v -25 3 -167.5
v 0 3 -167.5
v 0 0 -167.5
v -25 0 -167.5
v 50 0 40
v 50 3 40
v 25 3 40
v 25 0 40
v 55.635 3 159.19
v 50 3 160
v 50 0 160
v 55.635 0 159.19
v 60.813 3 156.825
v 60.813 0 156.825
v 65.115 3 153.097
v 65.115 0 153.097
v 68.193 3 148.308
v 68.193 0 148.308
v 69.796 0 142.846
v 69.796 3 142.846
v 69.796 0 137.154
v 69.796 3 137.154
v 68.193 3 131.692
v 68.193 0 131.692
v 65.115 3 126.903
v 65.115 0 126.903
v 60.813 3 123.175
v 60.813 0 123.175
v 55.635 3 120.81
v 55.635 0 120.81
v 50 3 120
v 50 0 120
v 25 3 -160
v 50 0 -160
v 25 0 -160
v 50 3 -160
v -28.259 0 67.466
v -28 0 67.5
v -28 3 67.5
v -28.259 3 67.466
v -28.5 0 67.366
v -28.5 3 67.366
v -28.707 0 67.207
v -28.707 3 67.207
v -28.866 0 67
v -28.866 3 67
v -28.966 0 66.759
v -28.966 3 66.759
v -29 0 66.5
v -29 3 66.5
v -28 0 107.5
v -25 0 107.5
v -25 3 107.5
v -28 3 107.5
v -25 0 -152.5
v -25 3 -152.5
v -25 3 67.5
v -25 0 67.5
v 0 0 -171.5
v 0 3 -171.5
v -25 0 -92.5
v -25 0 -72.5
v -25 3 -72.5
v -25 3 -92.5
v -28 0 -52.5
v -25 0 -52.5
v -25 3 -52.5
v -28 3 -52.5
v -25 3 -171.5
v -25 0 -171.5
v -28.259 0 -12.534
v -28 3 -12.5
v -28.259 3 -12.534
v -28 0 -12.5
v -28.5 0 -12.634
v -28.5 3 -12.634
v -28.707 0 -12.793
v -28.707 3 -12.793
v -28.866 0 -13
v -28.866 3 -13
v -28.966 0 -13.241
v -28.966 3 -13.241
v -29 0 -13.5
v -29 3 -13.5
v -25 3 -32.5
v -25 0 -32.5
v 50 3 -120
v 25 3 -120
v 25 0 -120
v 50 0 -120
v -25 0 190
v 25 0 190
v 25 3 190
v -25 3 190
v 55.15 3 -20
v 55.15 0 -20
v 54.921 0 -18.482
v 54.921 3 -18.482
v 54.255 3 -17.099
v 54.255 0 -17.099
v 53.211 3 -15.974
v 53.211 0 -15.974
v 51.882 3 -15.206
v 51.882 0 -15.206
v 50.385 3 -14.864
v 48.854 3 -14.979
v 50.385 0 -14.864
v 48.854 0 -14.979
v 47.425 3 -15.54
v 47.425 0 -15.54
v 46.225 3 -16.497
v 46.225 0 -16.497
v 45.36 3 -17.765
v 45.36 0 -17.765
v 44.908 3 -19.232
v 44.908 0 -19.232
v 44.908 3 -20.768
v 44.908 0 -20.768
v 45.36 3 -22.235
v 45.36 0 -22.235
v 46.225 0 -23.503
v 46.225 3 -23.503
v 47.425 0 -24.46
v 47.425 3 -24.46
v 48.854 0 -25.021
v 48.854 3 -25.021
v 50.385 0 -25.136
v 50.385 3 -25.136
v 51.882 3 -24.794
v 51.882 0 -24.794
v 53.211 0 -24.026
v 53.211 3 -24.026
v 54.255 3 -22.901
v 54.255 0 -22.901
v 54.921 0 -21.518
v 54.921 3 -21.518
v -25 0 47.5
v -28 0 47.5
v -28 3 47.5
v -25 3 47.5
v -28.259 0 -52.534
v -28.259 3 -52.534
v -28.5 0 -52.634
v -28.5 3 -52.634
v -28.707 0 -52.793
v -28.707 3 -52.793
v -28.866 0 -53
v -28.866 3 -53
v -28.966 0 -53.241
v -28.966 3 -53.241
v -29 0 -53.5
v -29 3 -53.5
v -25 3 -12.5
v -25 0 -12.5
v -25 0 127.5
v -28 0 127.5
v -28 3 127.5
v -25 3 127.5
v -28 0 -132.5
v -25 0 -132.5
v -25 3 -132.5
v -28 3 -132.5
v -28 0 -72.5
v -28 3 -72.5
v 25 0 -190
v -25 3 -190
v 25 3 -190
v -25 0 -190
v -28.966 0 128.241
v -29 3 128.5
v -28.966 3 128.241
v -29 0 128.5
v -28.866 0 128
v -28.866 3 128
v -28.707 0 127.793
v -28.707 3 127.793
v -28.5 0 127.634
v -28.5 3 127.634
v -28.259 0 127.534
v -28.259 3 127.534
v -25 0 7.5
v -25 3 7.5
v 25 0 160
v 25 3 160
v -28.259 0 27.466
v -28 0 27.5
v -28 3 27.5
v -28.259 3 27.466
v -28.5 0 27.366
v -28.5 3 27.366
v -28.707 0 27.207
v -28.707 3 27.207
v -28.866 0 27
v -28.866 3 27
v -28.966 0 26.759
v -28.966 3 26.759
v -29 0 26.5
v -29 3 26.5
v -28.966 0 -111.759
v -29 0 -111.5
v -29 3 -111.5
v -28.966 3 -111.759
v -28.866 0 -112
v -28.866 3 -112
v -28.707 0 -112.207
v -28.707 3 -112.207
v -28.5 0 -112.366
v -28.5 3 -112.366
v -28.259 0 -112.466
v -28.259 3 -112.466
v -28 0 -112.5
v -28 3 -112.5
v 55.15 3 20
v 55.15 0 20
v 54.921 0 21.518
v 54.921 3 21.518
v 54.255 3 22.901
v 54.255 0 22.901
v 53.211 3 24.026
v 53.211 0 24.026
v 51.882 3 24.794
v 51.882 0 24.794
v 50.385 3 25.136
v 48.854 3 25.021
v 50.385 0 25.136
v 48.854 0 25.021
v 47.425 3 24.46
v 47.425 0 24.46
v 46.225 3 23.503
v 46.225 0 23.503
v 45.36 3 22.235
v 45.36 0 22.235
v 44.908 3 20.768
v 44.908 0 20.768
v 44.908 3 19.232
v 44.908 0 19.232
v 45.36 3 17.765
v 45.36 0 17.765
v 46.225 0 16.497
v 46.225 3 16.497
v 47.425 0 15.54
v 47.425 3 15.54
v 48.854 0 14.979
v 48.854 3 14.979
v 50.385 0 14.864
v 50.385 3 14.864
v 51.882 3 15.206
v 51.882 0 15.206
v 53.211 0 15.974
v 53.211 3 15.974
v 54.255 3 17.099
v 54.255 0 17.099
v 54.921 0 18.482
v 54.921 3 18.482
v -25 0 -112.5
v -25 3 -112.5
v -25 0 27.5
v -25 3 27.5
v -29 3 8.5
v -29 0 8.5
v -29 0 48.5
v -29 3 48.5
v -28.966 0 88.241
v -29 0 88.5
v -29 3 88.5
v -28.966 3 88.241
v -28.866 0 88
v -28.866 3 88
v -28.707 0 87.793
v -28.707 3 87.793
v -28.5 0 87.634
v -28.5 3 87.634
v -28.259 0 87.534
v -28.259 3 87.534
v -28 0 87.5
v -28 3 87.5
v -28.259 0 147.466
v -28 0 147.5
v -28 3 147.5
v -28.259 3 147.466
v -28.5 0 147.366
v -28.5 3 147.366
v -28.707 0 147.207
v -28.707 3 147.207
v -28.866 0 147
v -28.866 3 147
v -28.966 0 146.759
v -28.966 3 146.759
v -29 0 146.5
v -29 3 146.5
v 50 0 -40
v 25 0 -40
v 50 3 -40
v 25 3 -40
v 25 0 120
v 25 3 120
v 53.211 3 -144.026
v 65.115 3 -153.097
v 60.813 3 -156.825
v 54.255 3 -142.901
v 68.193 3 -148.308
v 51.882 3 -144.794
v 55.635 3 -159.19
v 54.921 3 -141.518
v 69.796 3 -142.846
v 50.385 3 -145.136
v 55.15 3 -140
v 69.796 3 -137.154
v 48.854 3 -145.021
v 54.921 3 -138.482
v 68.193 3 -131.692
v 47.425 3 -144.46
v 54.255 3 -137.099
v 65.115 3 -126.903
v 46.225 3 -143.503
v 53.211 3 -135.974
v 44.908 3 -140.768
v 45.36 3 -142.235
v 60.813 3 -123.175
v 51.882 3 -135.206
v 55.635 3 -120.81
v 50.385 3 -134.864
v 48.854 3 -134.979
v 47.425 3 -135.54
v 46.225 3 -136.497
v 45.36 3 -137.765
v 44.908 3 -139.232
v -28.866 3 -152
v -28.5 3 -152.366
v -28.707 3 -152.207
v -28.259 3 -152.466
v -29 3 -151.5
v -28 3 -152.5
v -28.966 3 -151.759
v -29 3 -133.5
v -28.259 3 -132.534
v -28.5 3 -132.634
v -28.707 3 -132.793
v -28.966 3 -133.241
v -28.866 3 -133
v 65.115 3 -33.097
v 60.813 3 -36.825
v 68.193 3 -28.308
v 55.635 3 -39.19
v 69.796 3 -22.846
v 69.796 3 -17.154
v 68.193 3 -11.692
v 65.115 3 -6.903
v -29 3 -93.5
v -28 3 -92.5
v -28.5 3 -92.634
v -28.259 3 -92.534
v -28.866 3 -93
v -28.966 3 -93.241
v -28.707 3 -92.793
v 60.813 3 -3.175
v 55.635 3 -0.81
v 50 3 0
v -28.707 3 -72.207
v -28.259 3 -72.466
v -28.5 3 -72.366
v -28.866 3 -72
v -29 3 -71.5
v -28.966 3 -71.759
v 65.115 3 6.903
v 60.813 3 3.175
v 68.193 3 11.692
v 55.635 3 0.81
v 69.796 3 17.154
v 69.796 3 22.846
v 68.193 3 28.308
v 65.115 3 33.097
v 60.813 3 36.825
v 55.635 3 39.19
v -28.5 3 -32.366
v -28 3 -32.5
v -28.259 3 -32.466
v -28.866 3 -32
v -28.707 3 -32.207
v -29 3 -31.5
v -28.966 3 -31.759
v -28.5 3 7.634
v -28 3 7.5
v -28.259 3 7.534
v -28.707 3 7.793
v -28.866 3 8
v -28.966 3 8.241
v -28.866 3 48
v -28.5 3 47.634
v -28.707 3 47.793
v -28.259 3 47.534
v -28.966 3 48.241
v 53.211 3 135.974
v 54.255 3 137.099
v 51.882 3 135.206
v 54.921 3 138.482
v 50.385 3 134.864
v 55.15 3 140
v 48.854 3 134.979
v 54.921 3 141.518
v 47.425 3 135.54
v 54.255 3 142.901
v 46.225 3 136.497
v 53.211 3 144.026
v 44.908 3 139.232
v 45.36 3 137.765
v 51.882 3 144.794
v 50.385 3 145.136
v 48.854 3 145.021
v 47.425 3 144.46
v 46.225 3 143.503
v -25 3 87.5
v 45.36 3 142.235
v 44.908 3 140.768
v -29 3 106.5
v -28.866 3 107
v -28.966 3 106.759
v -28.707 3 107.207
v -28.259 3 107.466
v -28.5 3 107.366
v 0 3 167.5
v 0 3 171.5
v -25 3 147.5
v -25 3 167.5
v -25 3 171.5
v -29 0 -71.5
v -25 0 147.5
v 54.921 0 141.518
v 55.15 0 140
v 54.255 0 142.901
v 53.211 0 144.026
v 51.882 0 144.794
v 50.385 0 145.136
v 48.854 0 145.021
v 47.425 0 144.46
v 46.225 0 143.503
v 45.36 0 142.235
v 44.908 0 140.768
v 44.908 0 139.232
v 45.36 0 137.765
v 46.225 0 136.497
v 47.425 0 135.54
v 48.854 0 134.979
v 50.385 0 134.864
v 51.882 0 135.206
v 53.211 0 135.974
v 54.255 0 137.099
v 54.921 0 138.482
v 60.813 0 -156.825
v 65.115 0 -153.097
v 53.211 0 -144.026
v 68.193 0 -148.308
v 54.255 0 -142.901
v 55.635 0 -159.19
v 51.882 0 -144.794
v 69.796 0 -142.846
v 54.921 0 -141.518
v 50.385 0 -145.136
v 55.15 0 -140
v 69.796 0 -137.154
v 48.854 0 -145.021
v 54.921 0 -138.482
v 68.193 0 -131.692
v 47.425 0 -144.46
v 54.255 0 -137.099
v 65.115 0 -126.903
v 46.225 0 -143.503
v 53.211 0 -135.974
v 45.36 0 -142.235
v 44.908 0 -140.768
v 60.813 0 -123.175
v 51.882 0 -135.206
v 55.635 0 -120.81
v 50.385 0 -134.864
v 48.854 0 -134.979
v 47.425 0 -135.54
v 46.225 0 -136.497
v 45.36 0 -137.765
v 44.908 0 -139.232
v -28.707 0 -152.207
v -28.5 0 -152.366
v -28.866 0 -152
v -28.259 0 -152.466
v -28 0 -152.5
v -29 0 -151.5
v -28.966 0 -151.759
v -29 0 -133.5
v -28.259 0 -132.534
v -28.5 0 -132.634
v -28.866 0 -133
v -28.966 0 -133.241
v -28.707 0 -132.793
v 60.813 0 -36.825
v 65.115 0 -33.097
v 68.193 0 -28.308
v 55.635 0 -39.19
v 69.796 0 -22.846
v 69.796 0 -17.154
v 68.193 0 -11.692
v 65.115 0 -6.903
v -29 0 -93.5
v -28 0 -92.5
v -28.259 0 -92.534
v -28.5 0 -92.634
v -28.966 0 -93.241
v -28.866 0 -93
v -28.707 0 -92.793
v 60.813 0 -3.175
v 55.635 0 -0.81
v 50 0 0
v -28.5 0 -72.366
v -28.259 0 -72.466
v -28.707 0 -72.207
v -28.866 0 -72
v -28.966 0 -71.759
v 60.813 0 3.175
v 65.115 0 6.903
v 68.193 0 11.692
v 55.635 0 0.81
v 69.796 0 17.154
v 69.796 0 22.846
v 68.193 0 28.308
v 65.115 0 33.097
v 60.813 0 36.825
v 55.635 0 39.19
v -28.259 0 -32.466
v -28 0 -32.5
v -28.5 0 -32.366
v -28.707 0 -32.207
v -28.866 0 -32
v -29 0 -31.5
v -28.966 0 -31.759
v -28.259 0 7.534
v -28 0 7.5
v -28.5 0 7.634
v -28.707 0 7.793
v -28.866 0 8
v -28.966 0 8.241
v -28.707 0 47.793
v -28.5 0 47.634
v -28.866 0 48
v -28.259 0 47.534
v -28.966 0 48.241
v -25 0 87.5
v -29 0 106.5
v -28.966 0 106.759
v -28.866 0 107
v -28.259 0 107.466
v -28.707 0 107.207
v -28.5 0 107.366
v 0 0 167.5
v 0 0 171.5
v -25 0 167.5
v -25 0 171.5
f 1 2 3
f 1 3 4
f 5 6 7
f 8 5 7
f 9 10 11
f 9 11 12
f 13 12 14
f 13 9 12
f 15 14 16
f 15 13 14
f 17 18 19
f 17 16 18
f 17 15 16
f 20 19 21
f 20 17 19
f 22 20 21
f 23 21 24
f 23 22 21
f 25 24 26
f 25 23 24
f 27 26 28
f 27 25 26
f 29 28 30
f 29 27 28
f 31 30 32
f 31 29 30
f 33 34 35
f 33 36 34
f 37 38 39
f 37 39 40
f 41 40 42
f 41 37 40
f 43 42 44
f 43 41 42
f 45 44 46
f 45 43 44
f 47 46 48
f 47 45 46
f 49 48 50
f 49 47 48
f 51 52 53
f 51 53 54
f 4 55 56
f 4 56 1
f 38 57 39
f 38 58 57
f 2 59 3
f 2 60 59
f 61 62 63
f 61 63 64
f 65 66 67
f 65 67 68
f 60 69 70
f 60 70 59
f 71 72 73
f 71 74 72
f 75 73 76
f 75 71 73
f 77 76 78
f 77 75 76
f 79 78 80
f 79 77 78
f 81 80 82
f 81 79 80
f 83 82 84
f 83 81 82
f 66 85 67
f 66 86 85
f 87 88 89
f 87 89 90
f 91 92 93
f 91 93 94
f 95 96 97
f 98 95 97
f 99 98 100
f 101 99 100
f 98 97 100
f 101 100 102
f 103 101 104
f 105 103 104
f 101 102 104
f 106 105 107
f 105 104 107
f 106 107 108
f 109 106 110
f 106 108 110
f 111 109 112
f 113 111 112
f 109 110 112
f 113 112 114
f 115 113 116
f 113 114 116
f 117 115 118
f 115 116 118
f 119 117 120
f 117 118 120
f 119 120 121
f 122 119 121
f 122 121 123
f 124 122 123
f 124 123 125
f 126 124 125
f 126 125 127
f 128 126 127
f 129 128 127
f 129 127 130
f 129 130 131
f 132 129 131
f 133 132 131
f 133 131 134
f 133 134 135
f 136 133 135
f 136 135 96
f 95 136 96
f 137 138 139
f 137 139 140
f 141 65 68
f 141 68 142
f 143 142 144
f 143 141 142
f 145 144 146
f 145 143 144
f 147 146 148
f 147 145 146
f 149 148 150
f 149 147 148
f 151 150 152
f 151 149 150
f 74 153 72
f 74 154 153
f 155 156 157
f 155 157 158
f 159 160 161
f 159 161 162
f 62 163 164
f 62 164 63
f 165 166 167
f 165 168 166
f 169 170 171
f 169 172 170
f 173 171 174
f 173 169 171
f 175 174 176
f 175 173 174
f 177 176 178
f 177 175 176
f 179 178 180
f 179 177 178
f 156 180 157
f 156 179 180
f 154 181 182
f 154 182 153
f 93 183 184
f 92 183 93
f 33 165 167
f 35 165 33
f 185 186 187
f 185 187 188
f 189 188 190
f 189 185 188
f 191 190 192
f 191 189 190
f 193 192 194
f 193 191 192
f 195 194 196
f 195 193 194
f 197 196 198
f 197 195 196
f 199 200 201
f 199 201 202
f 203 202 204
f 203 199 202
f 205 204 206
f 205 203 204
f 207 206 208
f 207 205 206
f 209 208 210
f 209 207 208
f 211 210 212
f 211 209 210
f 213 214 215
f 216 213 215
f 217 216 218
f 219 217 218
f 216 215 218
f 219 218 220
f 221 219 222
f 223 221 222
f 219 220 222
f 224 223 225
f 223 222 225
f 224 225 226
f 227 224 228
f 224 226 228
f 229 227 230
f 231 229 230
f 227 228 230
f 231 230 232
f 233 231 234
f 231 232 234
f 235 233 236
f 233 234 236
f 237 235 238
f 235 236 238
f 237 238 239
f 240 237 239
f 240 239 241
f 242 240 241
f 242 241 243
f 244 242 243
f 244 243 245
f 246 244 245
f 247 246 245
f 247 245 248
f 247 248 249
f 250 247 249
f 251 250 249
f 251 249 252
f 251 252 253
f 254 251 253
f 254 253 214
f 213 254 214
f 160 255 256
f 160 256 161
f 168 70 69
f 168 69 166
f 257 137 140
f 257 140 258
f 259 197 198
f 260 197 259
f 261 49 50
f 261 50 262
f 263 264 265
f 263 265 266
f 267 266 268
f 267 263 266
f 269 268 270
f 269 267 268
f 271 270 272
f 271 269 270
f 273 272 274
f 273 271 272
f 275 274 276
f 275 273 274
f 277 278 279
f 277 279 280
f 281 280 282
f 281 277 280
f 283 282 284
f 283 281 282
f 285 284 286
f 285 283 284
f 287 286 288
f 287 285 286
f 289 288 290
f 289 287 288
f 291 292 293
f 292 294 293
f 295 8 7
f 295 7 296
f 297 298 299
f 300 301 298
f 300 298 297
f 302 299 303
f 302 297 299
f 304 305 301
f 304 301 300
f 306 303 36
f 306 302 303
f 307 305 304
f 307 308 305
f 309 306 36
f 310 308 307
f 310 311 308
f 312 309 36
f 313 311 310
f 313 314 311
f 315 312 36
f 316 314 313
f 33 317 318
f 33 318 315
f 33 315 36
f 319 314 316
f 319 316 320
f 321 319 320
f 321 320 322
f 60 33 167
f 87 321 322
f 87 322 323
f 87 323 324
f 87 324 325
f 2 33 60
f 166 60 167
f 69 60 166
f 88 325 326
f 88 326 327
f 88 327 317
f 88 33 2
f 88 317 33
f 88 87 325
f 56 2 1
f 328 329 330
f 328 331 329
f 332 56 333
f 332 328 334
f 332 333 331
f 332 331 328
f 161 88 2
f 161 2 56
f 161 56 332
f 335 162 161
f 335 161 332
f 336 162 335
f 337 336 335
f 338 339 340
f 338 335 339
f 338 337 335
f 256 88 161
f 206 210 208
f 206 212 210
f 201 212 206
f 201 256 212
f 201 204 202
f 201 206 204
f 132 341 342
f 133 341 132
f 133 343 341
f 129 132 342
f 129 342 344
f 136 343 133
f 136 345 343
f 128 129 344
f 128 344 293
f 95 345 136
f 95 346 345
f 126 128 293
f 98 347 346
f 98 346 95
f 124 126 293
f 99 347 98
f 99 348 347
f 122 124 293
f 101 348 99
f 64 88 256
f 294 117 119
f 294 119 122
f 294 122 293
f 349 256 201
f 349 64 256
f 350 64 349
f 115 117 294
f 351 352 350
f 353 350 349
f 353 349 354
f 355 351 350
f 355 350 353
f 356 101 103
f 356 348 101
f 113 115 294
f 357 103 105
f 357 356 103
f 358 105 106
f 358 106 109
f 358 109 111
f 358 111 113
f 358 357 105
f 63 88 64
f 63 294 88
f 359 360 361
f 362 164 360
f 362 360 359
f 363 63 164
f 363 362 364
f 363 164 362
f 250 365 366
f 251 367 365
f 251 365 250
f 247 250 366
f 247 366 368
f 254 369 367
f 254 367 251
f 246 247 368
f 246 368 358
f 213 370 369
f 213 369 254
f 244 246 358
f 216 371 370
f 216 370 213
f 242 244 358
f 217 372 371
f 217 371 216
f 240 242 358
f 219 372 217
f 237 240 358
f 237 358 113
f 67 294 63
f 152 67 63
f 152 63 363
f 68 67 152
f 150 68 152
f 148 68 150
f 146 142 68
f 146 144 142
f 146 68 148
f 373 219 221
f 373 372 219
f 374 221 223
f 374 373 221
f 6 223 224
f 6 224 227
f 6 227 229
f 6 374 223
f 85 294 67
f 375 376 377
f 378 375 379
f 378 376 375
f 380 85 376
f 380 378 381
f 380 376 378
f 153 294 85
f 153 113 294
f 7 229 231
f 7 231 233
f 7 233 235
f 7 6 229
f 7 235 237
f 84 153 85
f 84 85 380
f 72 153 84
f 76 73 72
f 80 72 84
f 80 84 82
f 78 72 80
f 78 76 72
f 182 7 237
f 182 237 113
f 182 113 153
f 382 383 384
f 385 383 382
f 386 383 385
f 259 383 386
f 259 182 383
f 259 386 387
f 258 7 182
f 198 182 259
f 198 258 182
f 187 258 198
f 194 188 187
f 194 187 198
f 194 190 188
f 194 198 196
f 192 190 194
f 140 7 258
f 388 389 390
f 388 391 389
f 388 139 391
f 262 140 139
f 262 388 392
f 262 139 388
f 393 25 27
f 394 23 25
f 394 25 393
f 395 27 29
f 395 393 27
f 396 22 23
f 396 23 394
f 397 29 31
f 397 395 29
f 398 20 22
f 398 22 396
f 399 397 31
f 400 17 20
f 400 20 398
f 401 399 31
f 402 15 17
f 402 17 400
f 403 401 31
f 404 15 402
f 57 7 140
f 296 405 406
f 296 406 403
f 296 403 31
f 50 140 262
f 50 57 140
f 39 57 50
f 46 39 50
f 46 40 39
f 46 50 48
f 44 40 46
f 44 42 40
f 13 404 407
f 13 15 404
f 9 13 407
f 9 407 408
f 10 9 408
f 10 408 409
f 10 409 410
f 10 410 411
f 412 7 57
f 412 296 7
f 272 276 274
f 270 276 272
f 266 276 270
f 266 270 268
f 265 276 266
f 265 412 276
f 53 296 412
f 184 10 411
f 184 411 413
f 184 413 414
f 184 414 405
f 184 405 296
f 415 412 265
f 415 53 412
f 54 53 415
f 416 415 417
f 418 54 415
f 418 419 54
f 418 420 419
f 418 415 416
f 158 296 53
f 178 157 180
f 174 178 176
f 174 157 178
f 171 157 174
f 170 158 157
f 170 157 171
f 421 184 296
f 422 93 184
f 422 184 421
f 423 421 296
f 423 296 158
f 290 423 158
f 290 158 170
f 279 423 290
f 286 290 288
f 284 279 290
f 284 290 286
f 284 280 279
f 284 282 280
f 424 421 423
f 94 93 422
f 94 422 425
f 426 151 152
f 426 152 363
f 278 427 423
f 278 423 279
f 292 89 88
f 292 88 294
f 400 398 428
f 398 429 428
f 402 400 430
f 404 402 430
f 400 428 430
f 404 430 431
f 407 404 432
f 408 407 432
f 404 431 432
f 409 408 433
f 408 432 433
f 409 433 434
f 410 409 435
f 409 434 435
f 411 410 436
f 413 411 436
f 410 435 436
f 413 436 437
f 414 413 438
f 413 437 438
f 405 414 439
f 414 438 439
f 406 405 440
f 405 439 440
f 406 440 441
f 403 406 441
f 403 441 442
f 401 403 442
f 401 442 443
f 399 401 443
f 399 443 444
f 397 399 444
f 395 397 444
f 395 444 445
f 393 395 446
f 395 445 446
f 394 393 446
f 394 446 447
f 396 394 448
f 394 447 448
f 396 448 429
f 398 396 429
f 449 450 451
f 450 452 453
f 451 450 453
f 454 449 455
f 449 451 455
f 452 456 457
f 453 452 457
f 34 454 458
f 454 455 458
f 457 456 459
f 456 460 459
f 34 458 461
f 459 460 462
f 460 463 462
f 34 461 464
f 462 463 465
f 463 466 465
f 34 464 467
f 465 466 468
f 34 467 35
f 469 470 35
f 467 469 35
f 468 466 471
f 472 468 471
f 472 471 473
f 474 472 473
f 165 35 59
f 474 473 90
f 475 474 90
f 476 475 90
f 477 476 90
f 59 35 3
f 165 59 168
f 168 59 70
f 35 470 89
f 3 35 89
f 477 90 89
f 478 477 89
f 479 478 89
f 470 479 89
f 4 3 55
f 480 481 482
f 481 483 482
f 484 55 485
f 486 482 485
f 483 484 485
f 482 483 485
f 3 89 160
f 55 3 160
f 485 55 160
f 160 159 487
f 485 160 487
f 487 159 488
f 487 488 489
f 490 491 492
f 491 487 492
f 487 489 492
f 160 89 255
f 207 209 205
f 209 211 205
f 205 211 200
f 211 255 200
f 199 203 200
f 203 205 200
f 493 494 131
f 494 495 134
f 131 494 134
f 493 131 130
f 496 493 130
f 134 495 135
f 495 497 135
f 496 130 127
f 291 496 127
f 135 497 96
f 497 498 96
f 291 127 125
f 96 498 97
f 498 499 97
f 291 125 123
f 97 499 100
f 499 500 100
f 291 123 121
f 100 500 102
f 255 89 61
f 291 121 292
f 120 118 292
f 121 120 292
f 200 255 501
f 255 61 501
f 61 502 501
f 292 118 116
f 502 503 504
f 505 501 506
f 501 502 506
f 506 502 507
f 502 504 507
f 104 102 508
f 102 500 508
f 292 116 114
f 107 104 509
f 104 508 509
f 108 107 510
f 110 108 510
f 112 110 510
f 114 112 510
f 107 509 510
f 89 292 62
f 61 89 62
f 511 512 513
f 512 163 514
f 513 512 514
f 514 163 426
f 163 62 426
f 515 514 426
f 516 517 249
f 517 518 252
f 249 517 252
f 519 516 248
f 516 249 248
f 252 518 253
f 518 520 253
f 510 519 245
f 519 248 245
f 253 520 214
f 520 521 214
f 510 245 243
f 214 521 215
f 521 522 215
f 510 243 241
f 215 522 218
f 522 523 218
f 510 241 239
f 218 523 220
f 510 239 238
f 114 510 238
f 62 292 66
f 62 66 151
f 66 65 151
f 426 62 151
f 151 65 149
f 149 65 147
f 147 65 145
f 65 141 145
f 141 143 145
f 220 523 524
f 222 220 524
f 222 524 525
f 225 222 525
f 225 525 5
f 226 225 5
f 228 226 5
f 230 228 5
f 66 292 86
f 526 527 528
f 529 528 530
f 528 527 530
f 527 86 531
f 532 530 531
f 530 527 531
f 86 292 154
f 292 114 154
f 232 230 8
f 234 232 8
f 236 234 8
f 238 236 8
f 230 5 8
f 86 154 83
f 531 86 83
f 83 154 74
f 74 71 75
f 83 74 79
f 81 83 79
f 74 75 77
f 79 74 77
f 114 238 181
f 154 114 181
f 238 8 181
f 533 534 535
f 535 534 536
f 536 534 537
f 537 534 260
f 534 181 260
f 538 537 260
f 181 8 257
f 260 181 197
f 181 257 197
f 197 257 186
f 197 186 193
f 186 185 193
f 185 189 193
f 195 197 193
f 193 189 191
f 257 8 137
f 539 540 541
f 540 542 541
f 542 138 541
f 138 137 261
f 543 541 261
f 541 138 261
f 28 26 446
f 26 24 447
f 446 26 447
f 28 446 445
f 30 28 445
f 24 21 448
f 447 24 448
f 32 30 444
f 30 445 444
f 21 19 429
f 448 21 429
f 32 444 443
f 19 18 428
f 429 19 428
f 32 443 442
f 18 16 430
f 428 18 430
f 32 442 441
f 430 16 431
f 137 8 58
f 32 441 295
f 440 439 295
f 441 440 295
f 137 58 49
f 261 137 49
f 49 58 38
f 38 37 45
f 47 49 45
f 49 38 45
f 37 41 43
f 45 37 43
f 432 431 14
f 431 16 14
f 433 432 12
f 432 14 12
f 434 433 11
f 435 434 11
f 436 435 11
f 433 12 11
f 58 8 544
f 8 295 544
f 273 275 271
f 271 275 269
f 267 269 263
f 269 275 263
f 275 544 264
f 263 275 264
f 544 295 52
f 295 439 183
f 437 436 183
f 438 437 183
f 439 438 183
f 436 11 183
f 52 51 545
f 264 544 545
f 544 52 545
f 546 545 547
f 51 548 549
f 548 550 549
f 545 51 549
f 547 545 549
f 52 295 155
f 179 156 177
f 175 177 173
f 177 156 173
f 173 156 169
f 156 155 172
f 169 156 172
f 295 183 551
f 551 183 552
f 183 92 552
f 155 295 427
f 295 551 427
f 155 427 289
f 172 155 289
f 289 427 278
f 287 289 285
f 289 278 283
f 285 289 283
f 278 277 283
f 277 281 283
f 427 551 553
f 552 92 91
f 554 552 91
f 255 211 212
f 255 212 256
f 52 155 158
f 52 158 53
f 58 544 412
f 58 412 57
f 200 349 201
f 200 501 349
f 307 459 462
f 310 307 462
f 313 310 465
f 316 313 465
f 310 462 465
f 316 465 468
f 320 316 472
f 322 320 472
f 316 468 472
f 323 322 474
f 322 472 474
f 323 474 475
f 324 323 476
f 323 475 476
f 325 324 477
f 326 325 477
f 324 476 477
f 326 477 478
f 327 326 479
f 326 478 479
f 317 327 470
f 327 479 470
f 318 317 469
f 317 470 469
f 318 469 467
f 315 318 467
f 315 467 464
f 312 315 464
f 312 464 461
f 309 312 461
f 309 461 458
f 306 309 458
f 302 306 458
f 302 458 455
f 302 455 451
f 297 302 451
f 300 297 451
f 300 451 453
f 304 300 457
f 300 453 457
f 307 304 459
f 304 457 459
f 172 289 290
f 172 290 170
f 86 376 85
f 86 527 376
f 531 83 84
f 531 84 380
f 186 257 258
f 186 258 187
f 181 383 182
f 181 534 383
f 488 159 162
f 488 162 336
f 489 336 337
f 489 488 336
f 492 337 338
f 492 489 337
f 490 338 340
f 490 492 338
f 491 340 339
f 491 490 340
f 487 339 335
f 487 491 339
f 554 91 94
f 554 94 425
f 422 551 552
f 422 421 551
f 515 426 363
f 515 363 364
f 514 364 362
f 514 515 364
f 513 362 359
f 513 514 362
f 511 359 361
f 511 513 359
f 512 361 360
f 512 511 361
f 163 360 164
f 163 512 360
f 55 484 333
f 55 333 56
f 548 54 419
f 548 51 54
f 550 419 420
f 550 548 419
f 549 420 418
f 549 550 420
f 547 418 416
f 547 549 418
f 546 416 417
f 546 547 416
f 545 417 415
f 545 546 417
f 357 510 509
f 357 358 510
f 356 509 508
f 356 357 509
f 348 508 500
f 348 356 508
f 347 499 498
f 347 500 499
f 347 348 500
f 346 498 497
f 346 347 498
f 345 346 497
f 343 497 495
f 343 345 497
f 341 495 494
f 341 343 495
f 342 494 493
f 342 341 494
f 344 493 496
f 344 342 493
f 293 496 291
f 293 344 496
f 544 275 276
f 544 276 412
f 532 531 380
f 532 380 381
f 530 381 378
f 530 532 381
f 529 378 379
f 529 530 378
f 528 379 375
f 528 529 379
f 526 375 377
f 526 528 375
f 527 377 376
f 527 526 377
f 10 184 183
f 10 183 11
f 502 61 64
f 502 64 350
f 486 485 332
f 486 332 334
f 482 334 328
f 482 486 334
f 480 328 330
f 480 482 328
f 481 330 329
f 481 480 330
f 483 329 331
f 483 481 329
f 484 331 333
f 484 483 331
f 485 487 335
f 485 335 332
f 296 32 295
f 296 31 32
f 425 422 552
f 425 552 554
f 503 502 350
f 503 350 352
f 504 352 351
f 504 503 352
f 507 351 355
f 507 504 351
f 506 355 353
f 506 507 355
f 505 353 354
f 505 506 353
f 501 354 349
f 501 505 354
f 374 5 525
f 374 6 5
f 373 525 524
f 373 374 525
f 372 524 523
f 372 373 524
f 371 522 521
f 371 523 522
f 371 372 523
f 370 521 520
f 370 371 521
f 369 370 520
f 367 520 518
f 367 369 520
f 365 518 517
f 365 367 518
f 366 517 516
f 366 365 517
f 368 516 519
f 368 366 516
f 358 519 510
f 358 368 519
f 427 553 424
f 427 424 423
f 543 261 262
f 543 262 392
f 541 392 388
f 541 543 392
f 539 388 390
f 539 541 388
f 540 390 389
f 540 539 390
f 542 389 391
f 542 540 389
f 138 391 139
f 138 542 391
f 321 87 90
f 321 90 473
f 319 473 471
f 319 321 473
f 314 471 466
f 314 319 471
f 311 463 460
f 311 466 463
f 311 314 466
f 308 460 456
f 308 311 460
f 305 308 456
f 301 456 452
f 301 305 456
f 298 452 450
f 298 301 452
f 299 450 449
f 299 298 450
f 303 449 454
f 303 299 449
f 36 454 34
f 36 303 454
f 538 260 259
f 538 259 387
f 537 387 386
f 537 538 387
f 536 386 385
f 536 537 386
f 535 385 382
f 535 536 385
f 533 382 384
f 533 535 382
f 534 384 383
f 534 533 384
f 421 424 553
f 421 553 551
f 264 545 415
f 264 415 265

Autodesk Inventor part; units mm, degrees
ref_plane "YZ Plane" through (0, 0, 0) normal (1, 0, 0) x (0, 1, 0)
ref_plane "XZ Plane" through (0, 0, 0) normal (0, 1, 0) x (-1, 0, 0)
ref_plane "XY Plane" through (0, 0, 0) normal (0, 0, 1) x (1, 0, 0)
sketch "Sketch1" plane through (0, 0, 0) normal (0, 1, 0) x (-1, 0, 0)
  line L0 (-25, 190) -> (25, 190)
  line L1 (25, 190) -> (25, -190)
  line L2 (25, -190) -> (-25, -190)
  line L3 (-25, -190) -> (-25, 190)
  line L4 (-25, 190) -> (25, -190) construction
  line L5 (25, 190) -> (-25, -190) construction
  point P0 (0, 0)
  dimension "d0" = 50
  dimension "d1" = 380
extrude "Extrusion1" add sketch "Sketch1" along normal blind 3
sketch "Sketch2" plane through (0, 3, 0) normal (0, 1, 0) x (1, 0, 0)
  line L0 (25, -160) -> (50, -160)
  line L1 (50, -160) -> (50, -120)
  line L2 (50, -120) -> (25, -120)
  line L3 (25, -120) -> (25, -160)
  line L4 (50, -40) -> (20, -40)
  line L5 (20, -40) -> (20, 40)
  line L6 (20, 40) -> (50, 40)
  line L7 (50, 40) -> (50, -40)
  line L8 (50, -40) -> (20, 40) construction
  line L9 (20, -40) -> (50, 40) construction
  line L10 (30, 160) -> (50, 160)
  line L11 (50, 160) -> (50, 120)
  line L12 (50, 120) -> (30, 120)
  line L13 (30, 120) -> (30, 160)
  circle A0 centre (50, -140) radius 20
  circle A1 centre (50, -20) radius 20
  circle A2 centre (50, 20) radius 20
  circle A3 centre (50, 140) radius 20
  line L14 (25, 190) -> (25, -190) projected
  line L15 (25, -190) -> (25, 190) projected
  line L16 (30, 160) -> (25, 160)
  line L17 (25, 160) -> (25, 120)
  line L18 (25, 120) -> (30, 120)
  line L19 (30, 120) -> (30, 160)
  line L20 (25, -120) -> (25, -120)
  line L21 (25, -120) -> (25, -150)
  line L22 (25, -150) -> (25, -150)
  line L23 (25, -150) -> (25, -120)
  line L24 (50, 0) -> (35, 0)
  line L25 (35, 0) -> (35, 5)
  line L26 (35, 5) -> (50, 5)
  line L27 (50, 5) -> (50, 0)
  line L28 (25, 190) -> (-25, 190) projected
  line L29 (-25, -190) -> (25, -190) projected
  point P0 (0, 0)
  point P1 (35, 0)
  dimension "d10" = 40
  dimension "d4" = 25
  dimension "d5" = 40
  dimension "d7" = 80
  dimension "d8" = 20
  dimension "d9" = 40
  dimension "d11" = 40
  dimension "d12" = 20
  dimension "d13" = 20
  dimension "d16" = 80
  dimension "d17" = 80
  dimension "d18" = 5
  dimension "d19" = 25
  dimension "d20" = 25
  dimension "d40" = 15
  dimension "d41" = 30
  dimension "d43" = 70
  dimension "d44" = 40
  dimension "d49" = 70
extrude "Extrusion2" add sketch "Sketch2" against normal blind 3
sketch "Sketch3" plane through (0, 3, 0) normal (0, 1, 0) x (1, 0, 0)
  line L0 (-25, 190) -> (-25, -190) projected
  line L1 (-25, -167.5) -> (0, -167.5)
  line L2 (0, -167.5) -> (0, -171.5)
  line L3 (0, -171.5) -> (-25, -171.5)
  line L4 (-25, -171.5) -> (-25, -167.5)
  line L5 (25, -190) -> (-25, -190) projected
  line L6 (-25, 171.5) -> (0, 171.5)
  line L7 (0, 171.5) -> (0, 167.5)
  line L8 (0, 167.5) -> (-25, 167.5)
  line L9 (-25, 167.5) -> (-25, 171.5)
  line L10 (-25, 190) -> (25, 190) projected
  point P0 (0, 0)
  dimension "d21" = 25
  dimension "d22" = 4
  dimension "d23" = 18.5
  dimension "d26" = 4
  dimension "d27" = 18.5
  dimension "d50" = 25
extrude "Extrusion3" cut sketch "Sketch3" against normal blind 3
sketch "Sketch4" plane through (0, 0, 0) normal (0, -1, 0) x (1, 0, 0)
  circle A0 centre (50, -20) radius 5.15
  arc A1 (50, -40) -> (50, 0) centre (50, -20) ccw projected
  circle A2 centre (50, 20) radius 5.15
  line L0 (25, 40) -> (50, 40) projected
  circle A3 centre (50, -140) radius 5.15
  line L1 (50, -120) -> (25, -120) projected
  arc A4 (50, -160) -> (50, -120) centre (50, -140) ccw projected
  circle A5 centre (50, 140) radius 5.15
  line L2 (50, 160) -> (25, 160) projected
  arc A6 (50, 120) -> (50, 160) centre (50, 140) ccw projected
  point P0 (0, 0)
  point P1 (25, 160)
  point P2 (25, 290)
  dimension "d28" = 10.3
  dimension "d30" = 0
  dimension "d31" = 10.3
  dimension "d33" = 10.3
  dimension "d36" = 10.3
  dimension "d42" = 40
  dimension "d51" = 0
  dimension "d52" = 0
extrude "Extrusion4" cut sketch "Sketch4" against normal blind 10
sketch "Sketch6" plane through (0, 0, 0) normal (0, -1, 0) x (1, 0, 0)
  line L0 (-25, 167.5) -> (-25, -167.5) projected
  line L1 (-25, 167.5) -> (0, 167.5) projected
  line L2 (-21, 147.5) -> (-28, 147.5)
  line L3 (-29, 146.5) -> (-29, 128.5)
  line L4 (-28, 127.5) -> (-21, 127.5)
  line L5 (-21, 127.5) -> (-21, 147.5)
  line L6 (-25, -167.5) -> (-25, 167.5) projected
  line L7 (-21, 147.5) -> (-29, 127.5) construction
  line L8 (-29, 147.5) -> (-21, 127.5) construction
  arc A0 (-28, 147.5) -> (-29, 146.5) centre (-28, 146.5) ccw
  arc A1 (-29, 128.5) -> (-28, 127.5) centre (-28, 128.5) ccw
  point P0 (0, 0)
  point P1 (-25, 137.5)
  dimension "d54" = 8
  dimension "d55" = 20
  dimension "d56" = 1
  dimension "d57" = 20
extrude "Extrusion5" add sketch "Sketch6" against normal blind 3
pattern_linear "Rectangular Pattern1" count 8 spacing 40 along (0, 0, -1) of "Extrusion5"
properties part number "zijiplaaten"
